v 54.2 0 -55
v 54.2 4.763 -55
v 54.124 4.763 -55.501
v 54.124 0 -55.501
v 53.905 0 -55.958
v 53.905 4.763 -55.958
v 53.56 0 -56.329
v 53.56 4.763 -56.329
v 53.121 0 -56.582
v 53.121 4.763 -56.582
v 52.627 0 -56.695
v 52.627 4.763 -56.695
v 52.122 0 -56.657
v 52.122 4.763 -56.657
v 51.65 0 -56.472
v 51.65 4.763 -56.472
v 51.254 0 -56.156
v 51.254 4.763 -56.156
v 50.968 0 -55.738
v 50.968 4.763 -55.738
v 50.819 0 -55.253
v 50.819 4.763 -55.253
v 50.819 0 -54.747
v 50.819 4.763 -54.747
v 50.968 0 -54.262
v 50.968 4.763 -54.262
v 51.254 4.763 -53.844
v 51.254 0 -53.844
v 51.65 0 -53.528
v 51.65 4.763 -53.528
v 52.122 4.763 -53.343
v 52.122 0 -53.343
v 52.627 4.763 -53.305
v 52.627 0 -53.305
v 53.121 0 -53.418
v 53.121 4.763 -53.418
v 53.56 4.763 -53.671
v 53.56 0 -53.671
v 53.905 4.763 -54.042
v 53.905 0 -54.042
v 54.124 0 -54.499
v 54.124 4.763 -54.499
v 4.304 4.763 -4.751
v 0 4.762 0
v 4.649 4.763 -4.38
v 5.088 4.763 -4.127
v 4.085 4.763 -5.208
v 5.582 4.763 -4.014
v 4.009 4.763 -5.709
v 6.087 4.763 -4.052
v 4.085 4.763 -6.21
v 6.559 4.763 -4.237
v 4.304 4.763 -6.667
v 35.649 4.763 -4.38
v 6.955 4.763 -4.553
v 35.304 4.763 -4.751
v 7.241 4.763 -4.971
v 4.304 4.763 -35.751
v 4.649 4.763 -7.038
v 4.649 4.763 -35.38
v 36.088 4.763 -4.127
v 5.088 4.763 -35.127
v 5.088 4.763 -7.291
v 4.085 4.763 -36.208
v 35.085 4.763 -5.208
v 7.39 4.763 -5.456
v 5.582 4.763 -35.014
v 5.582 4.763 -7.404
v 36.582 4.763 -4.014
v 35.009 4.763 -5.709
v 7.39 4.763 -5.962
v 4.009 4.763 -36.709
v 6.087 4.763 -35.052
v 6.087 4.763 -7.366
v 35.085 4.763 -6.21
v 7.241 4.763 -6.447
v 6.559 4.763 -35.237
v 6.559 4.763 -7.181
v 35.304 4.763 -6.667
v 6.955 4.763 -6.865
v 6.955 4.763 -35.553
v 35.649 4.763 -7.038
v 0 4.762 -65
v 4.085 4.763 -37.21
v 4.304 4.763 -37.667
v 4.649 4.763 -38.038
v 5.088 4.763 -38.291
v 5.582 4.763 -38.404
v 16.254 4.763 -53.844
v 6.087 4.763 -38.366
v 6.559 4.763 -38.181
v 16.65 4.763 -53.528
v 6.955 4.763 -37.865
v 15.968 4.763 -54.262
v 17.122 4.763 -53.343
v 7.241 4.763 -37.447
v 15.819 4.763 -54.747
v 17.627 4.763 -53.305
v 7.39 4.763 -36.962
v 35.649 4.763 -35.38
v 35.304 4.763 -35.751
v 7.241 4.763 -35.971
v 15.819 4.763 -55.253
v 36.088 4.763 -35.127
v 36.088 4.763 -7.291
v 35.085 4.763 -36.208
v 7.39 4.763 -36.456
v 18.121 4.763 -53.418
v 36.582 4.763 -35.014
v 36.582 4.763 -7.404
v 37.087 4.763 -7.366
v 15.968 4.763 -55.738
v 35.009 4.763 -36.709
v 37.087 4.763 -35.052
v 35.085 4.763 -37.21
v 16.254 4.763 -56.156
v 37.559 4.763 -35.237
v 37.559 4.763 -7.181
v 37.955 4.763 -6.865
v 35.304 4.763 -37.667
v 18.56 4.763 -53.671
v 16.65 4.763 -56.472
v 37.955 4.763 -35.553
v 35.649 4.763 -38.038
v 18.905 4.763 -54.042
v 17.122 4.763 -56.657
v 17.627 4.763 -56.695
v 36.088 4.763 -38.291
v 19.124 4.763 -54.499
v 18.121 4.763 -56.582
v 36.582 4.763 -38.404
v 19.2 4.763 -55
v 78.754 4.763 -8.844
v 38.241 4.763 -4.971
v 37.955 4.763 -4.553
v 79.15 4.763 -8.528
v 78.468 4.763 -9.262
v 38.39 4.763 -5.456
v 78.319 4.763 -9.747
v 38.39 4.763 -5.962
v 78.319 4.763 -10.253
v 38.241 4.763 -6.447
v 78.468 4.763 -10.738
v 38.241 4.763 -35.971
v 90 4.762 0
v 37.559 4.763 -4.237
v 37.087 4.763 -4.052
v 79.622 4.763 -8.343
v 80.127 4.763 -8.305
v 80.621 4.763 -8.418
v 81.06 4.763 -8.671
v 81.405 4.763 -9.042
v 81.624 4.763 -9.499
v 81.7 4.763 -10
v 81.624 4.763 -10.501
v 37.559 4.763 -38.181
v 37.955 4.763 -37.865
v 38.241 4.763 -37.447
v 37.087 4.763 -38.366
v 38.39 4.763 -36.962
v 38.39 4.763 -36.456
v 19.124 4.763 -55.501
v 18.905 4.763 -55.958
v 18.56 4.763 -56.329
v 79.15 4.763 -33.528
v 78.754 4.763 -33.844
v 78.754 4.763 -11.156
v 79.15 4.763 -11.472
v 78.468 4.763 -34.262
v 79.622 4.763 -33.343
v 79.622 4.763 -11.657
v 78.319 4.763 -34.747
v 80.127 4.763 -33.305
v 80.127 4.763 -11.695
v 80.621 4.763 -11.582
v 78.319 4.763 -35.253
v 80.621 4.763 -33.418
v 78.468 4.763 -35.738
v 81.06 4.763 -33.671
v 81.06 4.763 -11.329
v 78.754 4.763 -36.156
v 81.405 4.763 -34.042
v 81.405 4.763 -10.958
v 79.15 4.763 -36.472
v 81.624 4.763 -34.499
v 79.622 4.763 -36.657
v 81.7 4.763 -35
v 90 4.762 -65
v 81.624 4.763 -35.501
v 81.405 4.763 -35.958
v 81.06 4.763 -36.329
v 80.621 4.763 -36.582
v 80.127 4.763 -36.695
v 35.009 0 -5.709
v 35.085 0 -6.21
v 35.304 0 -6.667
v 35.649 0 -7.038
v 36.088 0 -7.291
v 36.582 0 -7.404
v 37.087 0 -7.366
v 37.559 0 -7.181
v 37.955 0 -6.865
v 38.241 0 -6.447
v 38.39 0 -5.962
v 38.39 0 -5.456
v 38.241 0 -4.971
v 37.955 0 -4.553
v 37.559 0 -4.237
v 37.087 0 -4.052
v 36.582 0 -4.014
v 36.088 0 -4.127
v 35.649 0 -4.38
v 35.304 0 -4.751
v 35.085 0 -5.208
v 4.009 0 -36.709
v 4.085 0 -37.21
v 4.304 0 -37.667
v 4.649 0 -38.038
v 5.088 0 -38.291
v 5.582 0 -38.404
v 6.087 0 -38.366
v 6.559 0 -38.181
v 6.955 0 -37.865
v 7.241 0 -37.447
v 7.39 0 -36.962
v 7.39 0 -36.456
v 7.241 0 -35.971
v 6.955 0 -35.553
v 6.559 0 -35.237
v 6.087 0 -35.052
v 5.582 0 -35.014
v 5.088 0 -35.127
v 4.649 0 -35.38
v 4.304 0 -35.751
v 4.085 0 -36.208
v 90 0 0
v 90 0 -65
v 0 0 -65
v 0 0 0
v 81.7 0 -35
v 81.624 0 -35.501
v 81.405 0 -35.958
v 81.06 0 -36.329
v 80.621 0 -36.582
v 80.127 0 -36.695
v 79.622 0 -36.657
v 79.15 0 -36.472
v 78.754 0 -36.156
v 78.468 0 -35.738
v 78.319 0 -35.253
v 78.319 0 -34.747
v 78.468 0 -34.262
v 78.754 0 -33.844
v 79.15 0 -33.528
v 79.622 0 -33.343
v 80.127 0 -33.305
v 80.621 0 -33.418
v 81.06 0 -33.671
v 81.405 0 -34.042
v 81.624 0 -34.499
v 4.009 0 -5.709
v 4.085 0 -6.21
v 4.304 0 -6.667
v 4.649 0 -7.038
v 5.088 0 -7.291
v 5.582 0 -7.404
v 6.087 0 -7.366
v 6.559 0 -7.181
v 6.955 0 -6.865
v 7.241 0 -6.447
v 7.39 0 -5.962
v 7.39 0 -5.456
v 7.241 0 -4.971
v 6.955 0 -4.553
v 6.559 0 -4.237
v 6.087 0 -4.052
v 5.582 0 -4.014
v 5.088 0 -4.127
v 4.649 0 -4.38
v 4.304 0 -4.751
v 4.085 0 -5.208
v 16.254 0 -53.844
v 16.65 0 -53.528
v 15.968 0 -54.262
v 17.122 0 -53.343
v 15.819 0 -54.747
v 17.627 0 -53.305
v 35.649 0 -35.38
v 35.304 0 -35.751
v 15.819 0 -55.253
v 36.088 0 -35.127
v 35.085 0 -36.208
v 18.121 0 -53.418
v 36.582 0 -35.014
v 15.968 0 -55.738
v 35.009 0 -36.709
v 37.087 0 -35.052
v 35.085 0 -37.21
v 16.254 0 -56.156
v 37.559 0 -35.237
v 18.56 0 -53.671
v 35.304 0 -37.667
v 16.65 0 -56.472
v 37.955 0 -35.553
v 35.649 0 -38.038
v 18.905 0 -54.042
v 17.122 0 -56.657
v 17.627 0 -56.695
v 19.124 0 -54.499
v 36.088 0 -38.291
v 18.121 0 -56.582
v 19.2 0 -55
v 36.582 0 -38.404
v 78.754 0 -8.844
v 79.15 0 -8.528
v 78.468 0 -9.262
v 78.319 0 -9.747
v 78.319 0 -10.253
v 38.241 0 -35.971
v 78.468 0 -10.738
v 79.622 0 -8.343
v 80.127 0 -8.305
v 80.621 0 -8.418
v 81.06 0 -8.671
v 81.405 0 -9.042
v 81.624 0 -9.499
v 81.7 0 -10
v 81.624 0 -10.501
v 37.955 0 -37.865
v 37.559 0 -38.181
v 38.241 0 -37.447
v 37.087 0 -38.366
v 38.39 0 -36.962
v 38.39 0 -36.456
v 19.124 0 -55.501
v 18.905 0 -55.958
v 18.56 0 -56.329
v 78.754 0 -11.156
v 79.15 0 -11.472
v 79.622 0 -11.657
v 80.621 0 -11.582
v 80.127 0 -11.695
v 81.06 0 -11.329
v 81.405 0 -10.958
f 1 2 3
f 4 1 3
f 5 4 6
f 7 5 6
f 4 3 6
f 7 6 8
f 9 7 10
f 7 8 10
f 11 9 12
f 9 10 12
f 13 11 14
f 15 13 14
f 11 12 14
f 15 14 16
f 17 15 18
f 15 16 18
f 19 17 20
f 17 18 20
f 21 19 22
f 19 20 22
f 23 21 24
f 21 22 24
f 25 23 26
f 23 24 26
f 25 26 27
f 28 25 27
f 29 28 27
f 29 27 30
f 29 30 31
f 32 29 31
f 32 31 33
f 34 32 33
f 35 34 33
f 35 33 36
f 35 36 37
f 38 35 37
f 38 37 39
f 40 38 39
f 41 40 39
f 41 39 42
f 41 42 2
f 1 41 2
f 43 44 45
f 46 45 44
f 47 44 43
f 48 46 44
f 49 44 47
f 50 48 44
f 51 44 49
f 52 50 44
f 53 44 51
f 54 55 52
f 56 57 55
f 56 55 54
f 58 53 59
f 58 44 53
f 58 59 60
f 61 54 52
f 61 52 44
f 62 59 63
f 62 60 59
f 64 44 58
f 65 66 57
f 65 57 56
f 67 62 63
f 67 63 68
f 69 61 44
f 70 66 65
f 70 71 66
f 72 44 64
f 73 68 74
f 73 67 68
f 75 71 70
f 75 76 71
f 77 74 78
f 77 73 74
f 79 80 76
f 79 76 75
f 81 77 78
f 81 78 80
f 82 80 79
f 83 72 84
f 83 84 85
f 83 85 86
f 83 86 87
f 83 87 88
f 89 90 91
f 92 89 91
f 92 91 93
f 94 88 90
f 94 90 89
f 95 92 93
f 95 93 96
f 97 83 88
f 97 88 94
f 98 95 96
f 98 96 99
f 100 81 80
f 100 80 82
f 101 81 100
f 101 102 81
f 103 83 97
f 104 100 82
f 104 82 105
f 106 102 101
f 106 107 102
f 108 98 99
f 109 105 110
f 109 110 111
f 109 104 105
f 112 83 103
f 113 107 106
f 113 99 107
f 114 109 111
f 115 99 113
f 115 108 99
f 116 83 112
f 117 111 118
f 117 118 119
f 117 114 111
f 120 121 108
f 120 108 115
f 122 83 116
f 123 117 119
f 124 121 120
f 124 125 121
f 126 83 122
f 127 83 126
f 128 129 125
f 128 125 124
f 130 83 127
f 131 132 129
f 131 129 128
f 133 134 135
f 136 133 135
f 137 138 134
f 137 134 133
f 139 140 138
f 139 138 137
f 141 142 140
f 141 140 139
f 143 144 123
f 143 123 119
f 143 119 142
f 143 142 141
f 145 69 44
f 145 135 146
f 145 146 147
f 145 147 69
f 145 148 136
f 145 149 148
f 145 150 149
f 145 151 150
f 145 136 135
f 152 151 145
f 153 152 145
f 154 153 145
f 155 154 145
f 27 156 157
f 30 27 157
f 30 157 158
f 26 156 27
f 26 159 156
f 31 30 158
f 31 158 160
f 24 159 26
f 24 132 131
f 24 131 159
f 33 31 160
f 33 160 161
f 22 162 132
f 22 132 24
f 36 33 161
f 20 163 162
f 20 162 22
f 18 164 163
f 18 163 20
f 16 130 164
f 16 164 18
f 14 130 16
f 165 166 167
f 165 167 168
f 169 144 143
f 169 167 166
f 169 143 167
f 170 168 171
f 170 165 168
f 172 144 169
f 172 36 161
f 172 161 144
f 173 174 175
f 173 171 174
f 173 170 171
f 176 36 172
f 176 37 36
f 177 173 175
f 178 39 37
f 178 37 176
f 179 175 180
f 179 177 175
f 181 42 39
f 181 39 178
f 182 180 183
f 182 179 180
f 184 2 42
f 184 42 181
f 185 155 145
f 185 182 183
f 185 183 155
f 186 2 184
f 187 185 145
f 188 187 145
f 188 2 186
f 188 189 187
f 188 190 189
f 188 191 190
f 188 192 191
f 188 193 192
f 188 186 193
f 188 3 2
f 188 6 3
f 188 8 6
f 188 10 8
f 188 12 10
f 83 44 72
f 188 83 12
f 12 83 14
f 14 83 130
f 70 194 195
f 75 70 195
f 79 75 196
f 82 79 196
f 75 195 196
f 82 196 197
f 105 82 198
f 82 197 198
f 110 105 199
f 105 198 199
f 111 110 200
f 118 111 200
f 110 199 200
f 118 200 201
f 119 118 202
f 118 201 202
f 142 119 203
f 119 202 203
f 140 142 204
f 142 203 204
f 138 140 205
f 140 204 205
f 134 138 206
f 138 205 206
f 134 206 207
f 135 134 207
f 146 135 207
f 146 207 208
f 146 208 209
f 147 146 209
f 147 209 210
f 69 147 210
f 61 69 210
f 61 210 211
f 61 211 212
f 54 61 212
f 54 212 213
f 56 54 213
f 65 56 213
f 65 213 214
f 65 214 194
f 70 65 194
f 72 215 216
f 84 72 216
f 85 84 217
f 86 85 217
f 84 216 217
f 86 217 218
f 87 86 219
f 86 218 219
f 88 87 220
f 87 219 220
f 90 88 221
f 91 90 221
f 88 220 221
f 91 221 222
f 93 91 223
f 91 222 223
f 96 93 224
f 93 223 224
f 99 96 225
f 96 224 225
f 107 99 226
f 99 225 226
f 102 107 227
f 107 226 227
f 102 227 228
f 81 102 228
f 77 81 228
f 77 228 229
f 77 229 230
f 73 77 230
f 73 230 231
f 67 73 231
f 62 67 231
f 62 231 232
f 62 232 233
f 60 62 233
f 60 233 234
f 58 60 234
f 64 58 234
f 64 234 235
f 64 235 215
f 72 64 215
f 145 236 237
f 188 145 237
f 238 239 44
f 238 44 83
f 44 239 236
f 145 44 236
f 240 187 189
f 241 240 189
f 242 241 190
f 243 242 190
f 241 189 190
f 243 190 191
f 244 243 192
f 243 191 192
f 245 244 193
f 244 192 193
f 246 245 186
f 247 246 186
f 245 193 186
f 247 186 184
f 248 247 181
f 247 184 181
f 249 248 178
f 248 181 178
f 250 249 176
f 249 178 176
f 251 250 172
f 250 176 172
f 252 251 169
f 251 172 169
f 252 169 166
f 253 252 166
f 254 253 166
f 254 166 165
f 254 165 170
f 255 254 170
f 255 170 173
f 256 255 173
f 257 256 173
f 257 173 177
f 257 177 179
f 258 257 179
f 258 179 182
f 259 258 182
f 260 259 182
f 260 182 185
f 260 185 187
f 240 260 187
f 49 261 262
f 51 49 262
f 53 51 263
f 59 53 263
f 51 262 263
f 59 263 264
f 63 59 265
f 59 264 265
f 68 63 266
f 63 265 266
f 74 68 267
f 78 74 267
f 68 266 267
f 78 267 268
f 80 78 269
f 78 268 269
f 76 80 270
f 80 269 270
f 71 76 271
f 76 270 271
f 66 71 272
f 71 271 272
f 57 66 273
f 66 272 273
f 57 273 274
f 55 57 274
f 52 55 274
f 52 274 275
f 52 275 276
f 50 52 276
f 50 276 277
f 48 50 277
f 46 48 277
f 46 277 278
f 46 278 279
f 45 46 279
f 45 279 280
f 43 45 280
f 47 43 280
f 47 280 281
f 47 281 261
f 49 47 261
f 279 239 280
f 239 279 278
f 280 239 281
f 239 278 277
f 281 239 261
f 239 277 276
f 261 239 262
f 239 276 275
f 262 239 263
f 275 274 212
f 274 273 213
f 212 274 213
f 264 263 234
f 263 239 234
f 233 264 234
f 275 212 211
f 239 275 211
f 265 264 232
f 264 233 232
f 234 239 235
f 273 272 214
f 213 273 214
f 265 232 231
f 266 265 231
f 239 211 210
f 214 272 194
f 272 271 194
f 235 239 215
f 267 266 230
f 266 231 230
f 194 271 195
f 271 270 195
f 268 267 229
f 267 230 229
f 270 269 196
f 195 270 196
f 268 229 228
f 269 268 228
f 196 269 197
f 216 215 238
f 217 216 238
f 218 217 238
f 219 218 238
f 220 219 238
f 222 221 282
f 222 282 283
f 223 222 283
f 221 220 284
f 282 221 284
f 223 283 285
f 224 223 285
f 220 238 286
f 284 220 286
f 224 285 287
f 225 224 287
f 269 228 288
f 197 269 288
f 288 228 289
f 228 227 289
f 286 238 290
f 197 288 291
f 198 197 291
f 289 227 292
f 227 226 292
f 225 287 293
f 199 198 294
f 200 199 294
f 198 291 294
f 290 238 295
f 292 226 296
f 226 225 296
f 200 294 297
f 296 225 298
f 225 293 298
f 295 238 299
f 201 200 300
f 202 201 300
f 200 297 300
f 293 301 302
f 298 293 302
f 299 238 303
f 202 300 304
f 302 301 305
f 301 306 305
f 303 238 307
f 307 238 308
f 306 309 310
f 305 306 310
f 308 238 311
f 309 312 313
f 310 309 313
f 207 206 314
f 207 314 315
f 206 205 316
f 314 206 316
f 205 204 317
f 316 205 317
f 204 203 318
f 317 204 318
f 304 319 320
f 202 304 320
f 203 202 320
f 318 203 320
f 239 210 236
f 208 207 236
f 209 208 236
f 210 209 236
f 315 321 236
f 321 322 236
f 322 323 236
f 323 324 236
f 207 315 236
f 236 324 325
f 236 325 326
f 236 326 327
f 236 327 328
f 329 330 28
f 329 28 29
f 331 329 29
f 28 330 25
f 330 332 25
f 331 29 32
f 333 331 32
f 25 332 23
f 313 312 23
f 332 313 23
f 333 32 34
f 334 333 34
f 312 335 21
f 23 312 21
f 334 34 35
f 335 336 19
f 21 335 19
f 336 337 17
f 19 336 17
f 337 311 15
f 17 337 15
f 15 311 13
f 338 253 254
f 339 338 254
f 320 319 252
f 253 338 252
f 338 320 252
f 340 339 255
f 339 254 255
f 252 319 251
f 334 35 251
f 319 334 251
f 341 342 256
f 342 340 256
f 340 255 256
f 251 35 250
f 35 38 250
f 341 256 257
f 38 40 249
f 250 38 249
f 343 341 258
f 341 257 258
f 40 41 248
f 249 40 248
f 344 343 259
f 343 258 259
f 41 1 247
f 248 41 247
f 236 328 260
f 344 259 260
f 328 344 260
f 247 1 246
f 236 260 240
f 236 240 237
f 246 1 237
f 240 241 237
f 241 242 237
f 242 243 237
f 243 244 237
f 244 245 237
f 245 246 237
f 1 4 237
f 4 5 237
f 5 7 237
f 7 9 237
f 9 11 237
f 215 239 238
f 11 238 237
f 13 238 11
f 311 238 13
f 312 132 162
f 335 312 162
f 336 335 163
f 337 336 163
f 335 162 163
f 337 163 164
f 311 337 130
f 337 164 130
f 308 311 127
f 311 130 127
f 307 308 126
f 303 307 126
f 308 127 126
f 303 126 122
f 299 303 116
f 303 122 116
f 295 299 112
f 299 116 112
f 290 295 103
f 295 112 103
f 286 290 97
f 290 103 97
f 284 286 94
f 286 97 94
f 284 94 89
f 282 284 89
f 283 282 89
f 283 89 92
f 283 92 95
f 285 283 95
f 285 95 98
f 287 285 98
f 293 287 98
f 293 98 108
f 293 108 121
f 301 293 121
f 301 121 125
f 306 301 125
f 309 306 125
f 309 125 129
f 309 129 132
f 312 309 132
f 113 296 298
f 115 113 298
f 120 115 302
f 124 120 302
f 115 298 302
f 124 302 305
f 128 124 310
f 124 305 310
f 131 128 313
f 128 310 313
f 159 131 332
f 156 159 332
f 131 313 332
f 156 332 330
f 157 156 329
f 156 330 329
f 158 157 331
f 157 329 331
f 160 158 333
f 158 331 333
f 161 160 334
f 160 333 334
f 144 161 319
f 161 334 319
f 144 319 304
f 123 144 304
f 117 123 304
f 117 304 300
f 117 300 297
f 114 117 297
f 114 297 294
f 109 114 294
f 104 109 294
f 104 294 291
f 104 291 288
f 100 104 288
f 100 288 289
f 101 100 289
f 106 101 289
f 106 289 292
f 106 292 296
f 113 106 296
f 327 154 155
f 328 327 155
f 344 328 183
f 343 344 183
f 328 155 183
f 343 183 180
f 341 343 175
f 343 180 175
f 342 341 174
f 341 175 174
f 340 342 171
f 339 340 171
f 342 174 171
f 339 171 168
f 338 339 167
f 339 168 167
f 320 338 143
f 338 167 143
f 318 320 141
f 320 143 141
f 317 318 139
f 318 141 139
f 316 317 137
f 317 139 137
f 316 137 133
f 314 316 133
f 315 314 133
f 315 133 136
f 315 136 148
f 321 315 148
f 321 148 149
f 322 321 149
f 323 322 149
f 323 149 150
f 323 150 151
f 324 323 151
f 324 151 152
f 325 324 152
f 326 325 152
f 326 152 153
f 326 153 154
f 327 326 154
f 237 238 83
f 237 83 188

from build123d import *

# Parameters (mm, degrees)
SKETCH1_W            = 90
SKETCH1_H            = 65
BOSS_EXTRUDE1_DEPTH  = 4.7625
M3_CLEARANCE_HOLE1_D = 3.4
M3_CLEARANCE_HOLE2_D = 3.4


with BuildPart() as part:
    # Sketch1 → Boss-Extrude1 (new body)
    with BuildSketch(Plane(origin=(0, 0, 0), x_dir=(1, 0, 0), z_dir=(0, 1, 0))):
        with Locations((45, 32.5)):
            Rectangle(SKETCH1_W, SKETCH1_H)
    extrude(amount=BOSS_EXTRUDE1_DEPTH)

    # M3 Clearance Hole1 (through all)
    with Locations(Plane(origin=(0, 4.7625, 0), x_dir=(1, 0, 0), z_dir=(0, 1, 0))):
        with Locations((36.709, 5.709), (36.709, 36.709), (5.709, 36.709), (5.709, 5.709)):
            Hole(M3_CLEARANCE_HOLE1_D / 2)

    # M3 Clearance Hole2 (through all)
    with Locations(Plane(origin=(0, 0, 0), x_dir=(-1, 0, 0), z_dir=(0, -1, 0))):
        with Locations((-17.5, 55), (-52.5, 55), (-80, 35), (-80, 10)):
            Hole(M3_CLEARANCE_HOLE2_D / 2)


solid = part.part
